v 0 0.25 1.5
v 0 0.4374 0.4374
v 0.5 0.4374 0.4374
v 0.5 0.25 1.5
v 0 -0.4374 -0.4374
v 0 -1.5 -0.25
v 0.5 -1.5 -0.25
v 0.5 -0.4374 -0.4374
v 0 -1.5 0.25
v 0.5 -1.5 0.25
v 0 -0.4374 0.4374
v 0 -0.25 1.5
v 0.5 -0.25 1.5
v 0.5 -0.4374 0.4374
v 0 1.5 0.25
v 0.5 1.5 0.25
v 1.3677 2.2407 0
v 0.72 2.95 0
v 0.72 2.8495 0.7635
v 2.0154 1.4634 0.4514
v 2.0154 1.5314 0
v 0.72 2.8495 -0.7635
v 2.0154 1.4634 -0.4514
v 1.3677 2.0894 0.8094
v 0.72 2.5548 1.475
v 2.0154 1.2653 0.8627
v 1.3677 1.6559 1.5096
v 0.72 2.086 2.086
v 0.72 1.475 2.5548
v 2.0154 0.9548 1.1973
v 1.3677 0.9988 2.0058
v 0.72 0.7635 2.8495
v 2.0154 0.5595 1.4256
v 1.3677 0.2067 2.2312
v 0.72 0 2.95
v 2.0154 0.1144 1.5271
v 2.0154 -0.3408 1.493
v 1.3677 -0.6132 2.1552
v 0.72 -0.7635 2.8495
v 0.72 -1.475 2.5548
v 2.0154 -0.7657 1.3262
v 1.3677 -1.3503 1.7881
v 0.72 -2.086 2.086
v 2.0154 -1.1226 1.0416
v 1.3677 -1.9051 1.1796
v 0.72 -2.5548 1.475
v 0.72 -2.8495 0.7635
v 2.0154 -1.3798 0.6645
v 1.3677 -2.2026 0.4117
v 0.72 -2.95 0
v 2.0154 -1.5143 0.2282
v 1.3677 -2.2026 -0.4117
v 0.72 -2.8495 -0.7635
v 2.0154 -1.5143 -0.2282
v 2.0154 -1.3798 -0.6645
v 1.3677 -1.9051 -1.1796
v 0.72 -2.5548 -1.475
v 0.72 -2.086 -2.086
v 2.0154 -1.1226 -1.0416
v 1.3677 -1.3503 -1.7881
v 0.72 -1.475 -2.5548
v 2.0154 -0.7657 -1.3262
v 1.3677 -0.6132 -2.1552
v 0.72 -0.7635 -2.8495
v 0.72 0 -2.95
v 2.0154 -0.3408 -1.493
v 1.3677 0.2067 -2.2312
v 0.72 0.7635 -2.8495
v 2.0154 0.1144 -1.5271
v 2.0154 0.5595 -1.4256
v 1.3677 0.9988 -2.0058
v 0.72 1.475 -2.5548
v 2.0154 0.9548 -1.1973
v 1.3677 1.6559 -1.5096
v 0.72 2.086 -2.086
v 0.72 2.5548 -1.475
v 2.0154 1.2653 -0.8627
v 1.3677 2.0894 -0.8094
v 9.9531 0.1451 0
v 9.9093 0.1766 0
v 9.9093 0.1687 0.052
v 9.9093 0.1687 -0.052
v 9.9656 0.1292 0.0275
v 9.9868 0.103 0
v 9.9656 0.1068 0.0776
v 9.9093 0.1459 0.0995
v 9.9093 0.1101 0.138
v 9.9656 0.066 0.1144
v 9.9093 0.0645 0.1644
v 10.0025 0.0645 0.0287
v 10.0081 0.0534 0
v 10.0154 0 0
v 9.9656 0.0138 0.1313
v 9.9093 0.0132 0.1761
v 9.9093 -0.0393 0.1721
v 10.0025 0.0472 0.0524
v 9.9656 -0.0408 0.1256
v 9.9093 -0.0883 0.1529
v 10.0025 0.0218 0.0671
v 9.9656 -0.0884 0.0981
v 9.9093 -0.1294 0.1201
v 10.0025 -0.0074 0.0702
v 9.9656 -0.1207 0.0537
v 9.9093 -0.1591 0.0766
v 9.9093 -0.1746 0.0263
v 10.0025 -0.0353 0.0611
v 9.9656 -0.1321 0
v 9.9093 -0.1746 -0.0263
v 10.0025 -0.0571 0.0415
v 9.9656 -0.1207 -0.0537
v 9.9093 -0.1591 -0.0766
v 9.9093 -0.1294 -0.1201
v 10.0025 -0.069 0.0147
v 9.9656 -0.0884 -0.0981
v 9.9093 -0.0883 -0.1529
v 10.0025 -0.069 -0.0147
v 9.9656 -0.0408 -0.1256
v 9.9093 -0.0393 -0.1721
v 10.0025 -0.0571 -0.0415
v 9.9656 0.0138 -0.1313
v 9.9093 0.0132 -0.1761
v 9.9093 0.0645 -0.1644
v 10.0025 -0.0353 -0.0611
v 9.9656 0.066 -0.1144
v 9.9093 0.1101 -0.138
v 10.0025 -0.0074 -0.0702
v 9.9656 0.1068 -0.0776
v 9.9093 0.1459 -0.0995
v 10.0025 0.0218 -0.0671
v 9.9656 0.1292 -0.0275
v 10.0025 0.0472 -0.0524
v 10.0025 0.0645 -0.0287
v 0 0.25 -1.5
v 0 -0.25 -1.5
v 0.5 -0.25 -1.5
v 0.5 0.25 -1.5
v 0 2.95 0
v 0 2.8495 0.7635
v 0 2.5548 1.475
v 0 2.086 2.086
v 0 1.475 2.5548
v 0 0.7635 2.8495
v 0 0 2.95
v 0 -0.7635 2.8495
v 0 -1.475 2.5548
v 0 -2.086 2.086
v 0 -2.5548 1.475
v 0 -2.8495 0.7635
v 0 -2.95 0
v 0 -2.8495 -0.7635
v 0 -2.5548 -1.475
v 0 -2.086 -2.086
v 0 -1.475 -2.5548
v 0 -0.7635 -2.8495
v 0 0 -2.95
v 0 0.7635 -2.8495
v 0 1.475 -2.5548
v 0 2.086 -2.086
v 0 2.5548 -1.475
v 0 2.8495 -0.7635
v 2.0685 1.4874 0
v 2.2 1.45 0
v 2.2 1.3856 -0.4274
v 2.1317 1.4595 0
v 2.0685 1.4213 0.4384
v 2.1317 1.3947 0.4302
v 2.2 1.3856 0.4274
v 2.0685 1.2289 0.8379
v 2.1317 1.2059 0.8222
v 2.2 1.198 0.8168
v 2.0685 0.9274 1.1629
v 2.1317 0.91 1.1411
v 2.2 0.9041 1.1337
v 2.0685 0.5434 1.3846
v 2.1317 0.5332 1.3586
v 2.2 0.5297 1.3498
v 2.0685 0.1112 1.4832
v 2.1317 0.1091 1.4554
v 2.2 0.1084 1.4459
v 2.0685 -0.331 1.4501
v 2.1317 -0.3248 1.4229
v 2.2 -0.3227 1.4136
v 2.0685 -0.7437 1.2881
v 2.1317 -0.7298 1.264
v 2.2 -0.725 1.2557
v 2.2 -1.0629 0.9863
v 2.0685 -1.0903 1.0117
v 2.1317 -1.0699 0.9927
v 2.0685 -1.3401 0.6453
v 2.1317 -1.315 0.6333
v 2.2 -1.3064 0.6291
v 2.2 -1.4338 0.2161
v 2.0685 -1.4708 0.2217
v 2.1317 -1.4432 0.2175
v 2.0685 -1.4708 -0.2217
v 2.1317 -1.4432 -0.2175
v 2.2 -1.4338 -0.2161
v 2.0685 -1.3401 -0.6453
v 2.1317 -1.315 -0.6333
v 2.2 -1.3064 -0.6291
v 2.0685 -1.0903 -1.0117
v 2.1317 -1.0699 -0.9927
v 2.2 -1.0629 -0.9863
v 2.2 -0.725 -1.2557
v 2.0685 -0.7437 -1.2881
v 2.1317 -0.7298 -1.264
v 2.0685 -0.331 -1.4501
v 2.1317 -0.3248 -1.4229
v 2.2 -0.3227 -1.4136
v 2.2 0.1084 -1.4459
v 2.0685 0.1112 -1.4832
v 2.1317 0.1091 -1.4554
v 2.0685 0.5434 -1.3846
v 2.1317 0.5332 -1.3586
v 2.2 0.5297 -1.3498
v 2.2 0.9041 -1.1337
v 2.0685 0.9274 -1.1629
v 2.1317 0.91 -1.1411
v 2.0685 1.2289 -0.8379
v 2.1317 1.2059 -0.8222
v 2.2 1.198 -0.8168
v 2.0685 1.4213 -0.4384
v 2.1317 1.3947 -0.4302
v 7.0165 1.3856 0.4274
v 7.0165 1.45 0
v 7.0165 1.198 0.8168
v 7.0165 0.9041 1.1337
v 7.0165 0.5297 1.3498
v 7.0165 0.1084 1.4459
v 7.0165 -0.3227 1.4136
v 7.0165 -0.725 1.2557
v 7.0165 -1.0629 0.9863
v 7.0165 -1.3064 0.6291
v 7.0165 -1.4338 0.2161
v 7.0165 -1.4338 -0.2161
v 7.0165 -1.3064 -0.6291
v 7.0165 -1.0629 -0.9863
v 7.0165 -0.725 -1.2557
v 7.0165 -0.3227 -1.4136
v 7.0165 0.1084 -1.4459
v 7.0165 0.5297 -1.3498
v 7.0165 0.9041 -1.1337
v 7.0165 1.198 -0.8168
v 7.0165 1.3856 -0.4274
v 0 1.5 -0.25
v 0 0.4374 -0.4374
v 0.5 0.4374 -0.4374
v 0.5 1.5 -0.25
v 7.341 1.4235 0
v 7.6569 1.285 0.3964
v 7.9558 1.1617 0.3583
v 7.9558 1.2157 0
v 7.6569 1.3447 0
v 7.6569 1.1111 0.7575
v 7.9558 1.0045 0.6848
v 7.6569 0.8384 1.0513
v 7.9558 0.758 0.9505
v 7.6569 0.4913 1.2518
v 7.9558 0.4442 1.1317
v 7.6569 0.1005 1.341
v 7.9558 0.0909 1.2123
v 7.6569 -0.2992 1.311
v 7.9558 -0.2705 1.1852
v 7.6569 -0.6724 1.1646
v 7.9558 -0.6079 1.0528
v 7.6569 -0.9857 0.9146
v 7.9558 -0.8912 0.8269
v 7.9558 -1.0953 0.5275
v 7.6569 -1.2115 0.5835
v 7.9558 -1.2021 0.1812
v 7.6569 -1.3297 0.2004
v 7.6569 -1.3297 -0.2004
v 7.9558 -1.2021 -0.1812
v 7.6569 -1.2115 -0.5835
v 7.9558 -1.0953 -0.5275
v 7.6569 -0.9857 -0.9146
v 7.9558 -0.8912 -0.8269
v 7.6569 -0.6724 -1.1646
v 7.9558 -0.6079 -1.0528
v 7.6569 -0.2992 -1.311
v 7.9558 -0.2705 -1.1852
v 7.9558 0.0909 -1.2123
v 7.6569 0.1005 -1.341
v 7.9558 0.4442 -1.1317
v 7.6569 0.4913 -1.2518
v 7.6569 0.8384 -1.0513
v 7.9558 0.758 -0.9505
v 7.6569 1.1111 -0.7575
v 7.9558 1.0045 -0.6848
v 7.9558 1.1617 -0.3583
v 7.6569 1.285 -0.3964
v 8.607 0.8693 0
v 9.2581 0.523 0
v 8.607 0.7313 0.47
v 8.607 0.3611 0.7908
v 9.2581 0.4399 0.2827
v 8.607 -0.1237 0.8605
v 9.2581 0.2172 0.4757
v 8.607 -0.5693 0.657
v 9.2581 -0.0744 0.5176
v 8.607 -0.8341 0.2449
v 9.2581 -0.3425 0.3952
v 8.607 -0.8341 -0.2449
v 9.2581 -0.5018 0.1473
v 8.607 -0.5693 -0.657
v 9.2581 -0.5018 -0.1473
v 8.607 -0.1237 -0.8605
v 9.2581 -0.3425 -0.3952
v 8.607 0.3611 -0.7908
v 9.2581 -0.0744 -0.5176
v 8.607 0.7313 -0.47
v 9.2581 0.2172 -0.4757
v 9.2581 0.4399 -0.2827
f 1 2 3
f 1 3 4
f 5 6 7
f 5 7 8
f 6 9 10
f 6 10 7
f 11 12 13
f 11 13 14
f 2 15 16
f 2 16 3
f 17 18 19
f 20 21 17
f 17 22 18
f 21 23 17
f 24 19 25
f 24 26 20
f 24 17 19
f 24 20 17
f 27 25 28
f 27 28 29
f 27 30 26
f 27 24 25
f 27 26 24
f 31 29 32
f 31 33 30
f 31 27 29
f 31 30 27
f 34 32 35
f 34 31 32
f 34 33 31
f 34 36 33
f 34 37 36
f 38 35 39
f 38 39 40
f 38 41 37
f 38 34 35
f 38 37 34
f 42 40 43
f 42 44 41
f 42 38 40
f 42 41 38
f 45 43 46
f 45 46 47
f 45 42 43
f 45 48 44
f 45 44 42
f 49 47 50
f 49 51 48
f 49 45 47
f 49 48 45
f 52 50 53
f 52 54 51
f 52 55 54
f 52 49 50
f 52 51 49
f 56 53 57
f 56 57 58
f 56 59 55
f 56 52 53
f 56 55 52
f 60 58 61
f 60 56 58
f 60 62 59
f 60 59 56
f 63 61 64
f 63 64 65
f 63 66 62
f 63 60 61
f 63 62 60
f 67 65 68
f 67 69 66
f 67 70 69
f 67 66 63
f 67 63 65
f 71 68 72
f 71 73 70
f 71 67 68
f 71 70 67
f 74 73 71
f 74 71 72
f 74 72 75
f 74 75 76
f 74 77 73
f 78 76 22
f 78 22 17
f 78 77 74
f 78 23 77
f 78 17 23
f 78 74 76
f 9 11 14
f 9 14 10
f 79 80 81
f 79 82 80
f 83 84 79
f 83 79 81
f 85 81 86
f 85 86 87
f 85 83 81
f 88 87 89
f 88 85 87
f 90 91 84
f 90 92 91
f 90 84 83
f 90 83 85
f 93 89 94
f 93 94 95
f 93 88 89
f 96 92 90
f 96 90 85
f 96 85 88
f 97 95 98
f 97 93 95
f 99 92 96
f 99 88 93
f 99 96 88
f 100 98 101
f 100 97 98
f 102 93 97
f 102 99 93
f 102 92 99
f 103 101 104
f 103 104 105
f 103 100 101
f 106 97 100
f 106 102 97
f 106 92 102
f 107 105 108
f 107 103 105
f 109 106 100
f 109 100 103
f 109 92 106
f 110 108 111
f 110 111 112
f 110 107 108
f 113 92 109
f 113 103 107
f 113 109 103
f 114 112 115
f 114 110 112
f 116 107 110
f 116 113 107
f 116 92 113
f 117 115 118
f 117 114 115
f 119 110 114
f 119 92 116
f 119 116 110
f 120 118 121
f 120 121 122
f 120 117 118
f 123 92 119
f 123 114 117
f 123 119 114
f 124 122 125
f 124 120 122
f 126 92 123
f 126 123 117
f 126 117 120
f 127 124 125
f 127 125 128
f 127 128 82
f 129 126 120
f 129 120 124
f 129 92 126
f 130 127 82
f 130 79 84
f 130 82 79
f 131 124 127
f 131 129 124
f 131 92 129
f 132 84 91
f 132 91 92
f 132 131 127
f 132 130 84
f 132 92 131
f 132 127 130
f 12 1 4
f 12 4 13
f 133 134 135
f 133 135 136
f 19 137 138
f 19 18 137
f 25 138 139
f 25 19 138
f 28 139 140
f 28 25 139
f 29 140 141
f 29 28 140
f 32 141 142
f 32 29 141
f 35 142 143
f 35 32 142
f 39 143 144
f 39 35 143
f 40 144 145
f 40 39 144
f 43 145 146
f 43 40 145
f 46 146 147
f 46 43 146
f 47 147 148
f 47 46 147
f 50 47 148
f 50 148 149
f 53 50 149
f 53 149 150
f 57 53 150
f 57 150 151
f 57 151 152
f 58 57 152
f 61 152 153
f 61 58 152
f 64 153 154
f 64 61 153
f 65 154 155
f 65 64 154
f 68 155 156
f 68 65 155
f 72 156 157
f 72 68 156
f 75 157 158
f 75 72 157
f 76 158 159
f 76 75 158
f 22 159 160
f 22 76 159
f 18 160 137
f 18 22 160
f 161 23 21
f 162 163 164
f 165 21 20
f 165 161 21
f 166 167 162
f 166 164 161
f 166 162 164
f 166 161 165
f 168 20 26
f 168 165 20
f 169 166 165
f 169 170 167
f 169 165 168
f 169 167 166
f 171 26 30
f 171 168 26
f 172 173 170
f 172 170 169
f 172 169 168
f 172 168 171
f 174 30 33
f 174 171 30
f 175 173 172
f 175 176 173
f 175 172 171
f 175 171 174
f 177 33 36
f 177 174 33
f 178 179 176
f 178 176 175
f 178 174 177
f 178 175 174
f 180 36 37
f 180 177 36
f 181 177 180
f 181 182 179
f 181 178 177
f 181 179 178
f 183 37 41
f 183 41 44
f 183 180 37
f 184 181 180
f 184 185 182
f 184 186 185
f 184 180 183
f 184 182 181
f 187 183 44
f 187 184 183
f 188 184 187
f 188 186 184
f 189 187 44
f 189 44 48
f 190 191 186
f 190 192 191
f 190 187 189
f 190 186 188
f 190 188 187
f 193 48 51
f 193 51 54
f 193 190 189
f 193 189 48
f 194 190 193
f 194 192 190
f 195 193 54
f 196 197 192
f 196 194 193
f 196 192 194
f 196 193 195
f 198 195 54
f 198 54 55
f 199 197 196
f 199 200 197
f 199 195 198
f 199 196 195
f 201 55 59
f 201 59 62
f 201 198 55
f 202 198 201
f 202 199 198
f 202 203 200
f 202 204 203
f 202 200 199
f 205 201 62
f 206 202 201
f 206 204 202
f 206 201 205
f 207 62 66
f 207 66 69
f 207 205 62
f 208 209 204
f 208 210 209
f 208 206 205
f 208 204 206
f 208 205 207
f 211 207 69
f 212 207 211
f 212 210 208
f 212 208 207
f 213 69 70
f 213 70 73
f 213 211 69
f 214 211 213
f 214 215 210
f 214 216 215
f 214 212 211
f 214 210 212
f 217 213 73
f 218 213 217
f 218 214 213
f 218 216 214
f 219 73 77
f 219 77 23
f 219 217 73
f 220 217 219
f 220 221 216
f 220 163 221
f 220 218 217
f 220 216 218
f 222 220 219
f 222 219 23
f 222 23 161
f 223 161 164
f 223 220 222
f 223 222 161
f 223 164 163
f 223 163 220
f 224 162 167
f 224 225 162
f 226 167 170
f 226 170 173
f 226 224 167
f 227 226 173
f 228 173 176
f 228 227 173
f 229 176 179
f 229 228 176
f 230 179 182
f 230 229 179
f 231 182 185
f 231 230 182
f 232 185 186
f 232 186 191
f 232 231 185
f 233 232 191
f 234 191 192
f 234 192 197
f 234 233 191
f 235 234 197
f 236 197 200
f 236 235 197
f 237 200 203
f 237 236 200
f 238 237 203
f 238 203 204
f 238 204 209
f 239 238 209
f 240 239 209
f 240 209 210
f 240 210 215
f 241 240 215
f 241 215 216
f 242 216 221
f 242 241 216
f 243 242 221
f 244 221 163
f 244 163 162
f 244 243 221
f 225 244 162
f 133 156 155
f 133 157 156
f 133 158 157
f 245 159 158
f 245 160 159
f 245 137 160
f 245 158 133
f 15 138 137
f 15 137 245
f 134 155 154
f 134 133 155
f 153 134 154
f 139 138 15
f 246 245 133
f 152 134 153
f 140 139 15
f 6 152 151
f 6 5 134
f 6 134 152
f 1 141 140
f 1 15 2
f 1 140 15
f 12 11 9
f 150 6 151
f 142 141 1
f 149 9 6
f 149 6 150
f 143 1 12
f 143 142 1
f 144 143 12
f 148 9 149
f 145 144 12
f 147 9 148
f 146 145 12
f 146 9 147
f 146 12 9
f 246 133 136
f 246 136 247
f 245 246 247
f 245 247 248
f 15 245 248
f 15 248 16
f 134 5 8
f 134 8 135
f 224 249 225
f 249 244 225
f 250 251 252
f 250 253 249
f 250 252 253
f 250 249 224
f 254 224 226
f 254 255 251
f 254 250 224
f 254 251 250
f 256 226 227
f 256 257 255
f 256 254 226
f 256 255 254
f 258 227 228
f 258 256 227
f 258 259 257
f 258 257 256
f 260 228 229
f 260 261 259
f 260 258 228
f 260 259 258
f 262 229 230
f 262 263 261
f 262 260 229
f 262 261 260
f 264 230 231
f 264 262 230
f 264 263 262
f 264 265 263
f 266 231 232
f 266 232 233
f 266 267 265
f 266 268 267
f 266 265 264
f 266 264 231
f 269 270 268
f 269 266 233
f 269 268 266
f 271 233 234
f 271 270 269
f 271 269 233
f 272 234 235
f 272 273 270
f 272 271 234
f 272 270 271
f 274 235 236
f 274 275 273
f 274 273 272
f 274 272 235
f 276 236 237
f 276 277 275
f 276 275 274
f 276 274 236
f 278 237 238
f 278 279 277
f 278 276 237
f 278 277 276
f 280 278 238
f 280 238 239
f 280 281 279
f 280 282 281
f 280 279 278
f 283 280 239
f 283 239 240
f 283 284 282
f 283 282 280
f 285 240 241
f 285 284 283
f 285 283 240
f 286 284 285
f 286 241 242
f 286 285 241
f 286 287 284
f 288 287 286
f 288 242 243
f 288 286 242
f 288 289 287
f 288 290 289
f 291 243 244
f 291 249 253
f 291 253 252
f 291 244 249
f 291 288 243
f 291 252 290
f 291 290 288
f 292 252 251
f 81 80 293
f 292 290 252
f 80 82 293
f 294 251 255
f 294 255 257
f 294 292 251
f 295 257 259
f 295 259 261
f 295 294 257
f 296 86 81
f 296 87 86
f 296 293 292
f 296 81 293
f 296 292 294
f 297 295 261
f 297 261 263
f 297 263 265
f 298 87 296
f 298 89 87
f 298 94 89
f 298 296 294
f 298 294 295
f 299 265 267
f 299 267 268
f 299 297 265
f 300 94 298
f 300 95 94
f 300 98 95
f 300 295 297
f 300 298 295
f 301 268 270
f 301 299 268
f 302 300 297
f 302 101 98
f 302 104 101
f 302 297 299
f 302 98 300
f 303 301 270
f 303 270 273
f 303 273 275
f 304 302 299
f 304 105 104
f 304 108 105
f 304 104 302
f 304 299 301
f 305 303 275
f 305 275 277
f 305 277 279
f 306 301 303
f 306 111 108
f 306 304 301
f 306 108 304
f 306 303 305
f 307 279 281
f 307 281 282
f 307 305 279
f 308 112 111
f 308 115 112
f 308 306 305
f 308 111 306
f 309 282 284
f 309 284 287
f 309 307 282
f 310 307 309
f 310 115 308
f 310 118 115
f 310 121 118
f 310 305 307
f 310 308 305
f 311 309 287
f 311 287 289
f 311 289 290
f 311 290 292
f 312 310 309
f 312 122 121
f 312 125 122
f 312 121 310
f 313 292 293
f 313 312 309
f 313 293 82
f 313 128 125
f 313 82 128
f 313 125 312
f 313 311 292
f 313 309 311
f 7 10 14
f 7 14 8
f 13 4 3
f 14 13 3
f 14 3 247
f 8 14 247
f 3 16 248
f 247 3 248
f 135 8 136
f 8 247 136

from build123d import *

# Parameters (mm, degrees)
CUT_EXTRUDE1_DEPTH = 0.5


with BuildPart() as part:
    # Sketch1 → Revolve1 (revolve)
    with BuildSketch(Plane.XY):
        with BuildLine():
            Line((0, 0), (0, 2.95))
            Line((0, 2.95), (0.72, 2.95))
            Line((0.72, 2.95), (2.015389317, 1.531420951))
            ThreePointArc((2.015389317, 1.531420951), (2.099115814, 1.47125914), (2.2, 1.45))
            Line((2.2, 1.45), (7.016541593, 1.45))
            ThreePointArc((7.016541593, 1.45), (7.500560514, 1.390547779), (7.955803436, 1.215725683))
            Line((7.955803436, 1.215725683), (9.909315501, 0.176572568))
            ThreePointArc((9.909315501, 0.176572568), (9.986832072, 0.102992143), (10.015389317, 0))
            Line((10.015389317, 0), (0, 0))
        make_face()
    revolve(axis=Axis((-3.974685283, 0, 0), (1, 0, 0)))

    # Sketch2 → Cut-Extrude1 (cut)
    with BuildSketch(Plane.ZY):
        Polygon((-0.25, 1.5), (0.25, 1.5), (0.437370289, 0.437370289), (1.5, 0.25), (1.5, -0.25), (0.437370289, -0.437370289), (0.25, -1.5), (-0.25, -1.5), (-0.437370289, -0.437370289), (-1.5, -0.25), (-1.5, 0.25), (-0.437370289, 0.437370289), align=None)
    extrude(amount=-CUT_EXTRUDE1_DEPTH, mode=Mode.SUBTRACT)


solid = part.part
